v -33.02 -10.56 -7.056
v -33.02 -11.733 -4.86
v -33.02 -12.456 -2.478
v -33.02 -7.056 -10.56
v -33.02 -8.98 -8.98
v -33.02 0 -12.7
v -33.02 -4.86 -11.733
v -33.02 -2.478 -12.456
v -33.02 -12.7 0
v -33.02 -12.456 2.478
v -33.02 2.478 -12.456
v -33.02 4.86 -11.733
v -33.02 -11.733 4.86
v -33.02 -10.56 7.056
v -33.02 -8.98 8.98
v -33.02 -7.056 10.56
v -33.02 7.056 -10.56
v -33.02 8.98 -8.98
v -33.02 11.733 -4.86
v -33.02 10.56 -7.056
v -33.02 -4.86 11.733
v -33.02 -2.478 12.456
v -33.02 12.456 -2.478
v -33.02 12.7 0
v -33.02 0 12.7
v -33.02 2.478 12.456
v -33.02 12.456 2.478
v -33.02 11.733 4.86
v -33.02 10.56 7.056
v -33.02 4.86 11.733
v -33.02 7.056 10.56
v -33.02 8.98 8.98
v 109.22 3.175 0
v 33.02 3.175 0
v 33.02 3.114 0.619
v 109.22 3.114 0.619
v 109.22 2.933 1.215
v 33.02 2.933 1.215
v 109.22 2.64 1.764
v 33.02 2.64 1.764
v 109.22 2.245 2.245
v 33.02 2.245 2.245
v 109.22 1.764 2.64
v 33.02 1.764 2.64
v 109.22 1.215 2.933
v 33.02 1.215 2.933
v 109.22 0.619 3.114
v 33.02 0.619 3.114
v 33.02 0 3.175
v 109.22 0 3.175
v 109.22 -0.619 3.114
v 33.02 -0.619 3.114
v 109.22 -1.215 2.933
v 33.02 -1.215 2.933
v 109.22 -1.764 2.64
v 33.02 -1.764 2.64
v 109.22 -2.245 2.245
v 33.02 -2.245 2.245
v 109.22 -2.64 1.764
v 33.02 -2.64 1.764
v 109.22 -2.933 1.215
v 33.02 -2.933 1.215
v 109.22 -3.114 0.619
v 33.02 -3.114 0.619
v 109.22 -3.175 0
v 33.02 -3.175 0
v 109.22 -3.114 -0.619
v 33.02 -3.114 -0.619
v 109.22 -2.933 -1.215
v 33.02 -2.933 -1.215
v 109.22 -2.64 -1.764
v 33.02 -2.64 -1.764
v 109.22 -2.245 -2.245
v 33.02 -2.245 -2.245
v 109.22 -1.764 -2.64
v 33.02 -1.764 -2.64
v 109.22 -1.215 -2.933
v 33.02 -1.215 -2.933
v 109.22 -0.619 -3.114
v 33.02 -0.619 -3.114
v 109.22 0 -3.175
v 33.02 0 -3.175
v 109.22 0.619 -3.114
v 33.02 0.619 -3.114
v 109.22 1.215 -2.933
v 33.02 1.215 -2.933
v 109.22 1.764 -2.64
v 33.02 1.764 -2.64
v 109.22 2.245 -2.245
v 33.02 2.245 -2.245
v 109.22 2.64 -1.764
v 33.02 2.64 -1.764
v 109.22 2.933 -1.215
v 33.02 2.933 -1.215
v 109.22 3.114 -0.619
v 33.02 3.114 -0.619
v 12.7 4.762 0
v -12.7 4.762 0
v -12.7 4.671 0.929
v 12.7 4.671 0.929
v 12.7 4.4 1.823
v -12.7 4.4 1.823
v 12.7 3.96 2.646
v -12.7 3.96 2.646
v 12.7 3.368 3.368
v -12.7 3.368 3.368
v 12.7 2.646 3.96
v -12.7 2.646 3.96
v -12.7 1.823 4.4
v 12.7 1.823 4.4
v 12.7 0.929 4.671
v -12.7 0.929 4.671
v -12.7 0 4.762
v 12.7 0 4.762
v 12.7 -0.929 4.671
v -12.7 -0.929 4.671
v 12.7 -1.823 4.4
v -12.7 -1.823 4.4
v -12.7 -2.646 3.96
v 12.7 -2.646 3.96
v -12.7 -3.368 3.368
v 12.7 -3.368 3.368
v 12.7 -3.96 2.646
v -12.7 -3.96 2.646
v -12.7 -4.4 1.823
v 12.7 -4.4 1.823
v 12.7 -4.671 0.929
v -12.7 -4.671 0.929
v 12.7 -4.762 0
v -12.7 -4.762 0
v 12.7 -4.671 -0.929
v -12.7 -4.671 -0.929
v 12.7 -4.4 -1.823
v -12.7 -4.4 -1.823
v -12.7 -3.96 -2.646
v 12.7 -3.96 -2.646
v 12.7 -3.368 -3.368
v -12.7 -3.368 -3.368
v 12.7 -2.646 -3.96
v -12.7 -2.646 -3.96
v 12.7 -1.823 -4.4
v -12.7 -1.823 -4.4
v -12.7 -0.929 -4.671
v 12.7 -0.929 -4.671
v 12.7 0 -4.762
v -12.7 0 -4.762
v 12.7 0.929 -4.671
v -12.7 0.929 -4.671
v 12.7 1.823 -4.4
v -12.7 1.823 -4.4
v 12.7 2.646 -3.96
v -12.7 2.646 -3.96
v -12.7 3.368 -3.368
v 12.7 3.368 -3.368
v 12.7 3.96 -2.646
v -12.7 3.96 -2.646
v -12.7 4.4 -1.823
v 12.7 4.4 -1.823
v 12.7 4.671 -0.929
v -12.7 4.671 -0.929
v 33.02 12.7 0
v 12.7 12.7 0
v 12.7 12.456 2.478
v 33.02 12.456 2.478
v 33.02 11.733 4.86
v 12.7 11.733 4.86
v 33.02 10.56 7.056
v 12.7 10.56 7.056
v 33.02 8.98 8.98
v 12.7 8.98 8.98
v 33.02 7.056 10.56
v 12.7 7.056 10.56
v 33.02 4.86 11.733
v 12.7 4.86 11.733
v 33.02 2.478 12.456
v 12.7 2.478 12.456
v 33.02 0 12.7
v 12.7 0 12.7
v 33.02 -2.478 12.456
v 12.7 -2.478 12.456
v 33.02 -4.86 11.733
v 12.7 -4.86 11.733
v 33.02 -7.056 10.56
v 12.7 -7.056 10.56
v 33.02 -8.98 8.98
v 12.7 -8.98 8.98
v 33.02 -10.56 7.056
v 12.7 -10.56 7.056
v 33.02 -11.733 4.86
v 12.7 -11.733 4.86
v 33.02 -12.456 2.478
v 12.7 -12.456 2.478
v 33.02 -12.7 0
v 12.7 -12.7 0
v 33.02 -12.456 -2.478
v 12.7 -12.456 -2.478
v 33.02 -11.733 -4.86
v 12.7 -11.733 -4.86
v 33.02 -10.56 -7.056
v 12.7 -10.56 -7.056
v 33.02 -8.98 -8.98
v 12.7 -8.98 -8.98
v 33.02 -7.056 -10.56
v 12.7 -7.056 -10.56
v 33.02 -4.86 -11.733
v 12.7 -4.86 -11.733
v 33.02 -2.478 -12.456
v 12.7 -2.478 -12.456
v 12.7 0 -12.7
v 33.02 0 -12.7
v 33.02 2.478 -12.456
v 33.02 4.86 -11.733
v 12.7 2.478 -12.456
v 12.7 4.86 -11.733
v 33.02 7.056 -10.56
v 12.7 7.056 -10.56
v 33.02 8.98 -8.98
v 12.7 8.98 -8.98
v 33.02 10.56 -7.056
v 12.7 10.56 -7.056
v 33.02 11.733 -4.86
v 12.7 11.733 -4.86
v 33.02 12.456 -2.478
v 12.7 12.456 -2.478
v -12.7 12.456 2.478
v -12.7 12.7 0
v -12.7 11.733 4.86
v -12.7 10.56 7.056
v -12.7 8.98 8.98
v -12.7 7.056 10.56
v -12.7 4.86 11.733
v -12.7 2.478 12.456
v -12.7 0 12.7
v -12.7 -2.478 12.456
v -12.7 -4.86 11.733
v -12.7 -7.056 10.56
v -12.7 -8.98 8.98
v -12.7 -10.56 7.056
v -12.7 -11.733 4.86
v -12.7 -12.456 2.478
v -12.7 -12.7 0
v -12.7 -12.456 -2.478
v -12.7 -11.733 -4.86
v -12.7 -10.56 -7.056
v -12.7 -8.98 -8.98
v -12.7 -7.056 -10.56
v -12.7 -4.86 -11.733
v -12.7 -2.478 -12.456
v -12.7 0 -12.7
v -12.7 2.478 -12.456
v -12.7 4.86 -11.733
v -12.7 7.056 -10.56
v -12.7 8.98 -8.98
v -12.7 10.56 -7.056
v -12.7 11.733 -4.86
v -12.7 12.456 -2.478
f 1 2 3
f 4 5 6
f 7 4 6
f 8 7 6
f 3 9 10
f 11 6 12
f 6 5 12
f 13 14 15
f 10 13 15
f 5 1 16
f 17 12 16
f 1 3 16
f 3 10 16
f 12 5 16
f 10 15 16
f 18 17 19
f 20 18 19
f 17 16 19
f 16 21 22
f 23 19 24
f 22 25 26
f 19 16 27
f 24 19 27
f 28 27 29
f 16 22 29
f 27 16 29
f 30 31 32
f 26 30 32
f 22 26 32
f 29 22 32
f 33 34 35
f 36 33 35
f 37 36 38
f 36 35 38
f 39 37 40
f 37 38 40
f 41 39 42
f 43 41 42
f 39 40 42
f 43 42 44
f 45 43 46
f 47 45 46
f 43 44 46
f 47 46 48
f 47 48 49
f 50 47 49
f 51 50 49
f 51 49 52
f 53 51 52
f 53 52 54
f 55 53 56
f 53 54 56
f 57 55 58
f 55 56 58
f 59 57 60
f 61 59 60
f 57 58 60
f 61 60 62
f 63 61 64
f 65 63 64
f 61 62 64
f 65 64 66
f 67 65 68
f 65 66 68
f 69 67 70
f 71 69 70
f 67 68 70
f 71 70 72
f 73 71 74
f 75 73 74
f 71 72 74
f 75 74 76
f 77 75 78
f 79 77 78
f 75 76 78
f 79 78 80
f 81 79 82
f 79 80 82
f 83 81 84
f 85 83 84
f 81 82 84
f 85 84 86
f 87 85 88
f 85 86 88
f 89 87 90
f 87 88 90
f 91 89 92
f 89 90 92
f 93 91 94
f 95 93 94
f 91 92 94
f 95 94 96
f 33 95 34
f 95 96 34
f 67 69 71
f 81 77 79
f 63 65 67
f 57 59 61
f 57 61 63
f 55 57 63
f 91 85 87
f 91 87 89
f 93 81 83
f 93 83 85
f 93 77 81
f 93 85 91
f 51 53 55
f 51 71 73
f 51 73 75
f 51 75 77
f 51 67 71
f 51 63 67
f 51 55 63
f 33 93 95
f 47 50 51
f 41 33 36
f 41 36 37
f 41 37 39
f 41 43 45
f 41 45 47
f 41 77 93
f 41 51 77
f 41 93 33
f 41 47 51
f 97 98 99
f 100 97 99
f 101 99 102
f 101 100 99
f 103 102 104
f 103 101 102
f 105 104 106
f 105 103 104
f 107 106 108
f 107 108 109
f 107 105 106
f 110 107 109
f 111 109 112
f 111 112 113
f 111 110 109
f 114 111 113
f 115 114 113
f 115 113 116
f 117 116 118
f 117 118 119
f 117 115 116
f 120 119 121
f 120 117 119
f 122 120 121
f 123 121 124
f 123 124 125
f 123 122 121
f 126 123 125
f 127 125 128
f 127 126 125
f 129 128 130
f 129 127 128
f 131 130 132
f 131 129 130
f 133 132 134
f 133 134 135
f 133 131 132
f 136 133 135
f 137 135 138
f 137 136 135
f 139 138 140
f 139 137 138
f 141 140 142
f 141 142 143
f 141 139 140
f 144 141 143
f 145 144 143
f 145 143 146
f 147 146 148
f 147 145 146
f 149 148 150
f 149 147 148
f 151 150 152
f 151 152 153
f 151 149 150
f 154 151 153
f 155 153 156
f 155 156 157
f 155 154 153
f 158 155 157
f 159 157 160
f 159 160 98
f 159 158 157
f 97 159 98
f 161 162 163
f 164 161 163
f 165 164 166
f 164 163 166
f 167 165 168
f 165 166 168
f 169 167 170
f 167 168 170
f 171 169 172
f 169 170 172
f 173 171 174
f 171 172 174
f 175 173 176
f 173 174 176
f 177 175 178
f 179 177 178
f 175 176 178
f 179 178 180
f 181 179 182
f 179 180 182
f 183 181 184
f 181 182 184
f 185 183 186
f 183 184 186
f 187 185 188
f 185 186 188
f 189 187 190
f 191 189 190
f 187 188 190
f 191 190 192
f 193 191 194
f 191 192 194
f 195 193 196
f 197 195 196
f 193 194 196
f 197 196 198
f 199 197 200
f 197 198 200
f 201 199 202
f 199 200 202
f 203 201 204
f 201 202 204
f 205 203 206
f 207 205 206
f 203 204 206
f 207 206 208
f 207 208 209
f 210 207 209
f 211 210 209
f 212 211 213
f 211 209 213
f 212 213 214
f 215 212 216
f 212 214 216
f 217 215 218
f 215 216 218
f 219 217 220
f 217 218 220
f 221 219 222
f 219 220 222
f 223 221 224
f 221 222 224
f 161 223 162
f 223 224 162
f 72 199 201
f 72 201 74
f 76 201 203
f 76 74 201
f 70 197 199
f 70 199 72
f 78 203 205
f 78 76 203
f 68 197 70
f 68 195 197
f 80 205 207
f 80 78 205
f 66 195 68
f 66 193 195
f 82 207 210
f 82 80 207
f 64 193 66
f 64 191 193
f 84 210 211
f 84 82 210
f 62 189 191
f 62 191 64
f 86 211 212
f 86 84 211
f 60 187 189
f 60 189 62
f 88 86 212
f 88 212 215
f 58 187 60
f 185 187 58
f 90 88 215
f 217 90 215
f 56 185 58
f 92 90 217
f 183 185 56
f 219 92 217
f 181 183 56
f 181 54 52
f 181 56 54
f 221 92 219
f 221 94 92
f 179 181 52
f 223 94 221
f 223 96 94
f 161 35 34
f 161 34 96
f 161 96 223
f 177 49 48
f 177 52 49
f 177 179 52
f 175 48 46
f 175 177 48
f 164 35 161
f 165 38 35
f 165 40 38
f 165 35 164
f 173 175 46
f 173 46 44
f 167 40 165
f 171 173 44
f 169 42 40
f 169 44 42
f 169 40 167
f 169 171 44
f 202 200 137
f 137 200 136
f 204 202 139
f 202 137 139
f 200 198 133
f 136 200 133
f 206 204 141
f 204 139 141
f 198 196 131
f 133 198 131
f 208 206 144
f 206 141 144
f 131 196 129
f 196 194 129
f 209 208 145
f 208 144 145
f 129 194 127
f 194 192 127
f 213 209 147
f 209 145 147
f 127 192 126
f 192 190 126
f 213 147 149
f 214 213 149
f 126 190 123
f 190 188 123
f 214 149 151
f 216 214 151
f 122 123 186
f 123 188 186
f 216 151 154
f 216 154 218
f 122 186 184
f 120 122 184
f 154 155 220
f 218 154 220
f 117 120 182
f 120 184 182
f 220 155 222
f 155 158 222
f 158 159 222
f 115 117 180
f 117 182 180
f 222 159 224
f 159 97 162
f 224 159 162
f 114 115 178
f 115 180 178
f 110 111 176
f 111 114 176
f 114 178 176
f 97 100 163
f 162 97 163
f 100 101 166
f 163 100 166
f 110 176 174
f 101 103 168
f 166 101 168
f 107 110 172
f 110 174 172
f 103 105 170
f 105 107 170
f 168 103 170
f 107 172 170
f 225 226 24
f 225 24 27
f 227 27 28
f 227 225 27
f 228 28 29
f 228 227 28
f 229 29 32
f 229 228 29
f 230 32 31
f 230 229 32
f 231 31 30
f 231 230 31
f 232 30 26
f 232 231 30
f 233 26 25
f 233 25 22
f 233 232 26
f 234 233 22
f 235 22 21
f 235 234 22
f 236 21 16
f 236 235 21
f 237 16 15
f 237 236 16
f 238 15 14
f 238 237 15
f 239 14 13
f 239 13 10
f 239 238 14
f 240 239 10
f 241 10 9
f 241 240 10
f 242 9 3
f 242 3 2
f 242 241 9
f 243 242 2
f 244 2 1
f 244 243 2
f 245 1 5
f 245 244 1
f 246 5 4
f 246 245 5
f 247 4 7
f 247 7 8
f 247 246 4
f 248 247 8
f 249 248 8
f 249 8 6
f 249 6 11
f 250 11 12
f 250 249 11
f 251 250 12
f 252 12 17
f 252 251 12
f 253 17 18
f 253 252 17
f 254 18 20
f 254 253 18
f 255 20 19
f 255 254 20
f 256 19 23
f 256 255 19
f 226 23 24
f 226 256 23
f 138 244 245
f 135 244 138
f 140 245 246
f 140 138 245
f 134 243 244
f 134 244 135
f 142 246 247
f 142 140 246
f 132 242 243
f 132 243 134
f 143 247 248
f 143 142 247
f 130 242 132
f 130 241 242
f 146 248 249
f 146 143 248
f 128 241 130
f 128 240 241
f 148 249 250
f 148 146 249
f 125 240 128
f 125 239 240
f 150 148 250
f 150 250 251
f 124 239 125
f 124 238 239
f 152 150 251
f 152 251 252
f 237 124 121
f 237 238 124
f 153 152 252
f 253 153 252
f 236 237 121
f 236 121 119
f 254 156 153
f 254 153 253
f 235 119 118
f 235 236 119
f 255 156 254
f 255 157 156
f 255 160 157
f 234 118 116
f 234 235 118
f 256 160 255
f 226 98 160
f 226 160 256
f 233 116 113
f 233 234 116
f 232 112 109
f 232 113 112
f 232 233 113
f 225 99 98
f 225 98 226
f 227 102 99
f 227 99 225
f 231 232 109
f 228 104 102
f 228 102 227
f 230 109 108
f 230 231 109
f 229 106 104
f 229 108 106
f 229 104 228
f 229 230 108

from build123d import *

# Parameters (mm, degrees)
F0_R     = 4.7625
F1_DEPTH = 12.7
F2_R     = 12.7
F3_DEPTH = 20.32
F5_R     = 3.175
F6_DEPTH = 76.2


with BuildPart() as f1:
    # F0 (on Right) → F1 (new body)
    with BuildSketch(Plane.YZ):
        Circle(F0_R)
    extrude(amount=F1_DEPTH)

    # F2 (on face) → F3 (join)
    with BuildSketch(Plane.YZ.offset(12.7)):
        Circle(F2_R)
    extrude(amount=F3_DEPTH)

    # F4: F1 across plane


with BuildPart() as f1_1:
    add(f1.part)
    add(f1.part.mirror(Plane.YZ))

    # F5 (on face) → F6 (join)
    with BuildSketch(Plane.YZ.offset(33.02)):
        Circle(F5_R)
    extrude(amount=F6_DEPTH)


solid = f1_1.part
